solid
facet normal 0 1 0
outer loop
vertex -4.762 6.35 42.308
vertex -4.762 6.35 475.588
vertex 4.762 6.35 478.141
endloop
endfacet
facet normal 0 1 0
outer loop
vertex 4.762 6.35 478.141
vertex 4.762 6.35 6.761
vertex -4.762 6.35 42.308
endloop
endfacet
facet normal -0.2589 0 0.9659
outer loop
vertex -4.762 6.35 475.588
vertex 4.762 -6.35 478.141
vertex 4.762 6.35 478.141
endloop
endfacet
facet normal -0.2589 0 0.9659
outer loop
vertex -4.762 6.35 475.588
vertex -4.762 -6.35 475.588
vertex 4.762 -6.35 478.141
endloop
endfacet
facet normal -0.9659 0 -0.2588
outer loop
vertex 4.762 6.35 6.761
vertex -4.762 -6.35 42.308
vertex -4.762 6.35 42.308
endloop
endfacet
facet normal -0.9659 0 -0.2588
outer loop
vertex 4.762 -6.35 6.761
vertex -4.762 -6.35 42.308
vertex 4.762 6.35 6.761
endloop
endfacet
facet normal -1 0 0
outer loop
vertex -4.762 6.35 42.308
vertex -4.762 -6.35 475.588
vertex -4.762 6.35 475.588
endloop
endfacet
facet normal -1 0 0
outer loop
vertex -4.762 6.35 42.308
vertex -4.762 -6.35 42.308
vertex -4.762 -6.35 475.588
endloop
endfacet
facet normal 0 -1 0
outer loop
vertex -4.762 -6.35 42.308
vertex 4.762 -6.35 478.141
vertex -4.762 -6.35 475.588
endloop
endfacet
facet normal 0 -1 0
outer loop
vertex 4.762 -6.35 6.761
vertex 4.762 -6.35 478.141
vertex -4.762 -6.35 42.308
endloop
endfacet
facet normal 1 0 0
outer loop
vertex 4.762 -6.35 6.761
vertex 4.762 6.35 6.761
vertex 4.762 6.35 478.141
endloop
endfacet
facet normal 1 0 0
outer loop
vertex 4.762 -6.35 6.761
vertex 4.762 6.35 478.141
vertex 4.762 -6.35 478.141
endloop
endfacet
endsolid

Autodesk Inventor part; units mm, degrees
ref_plane "Start plane" through (0, 0, 6.7606) normal (0, 0, 1) x (1, 0, 0)
ref_plane "End plane" through (0, 0, 478.1407) normal (0, 0, 1) x (1, 0, 0)
sketch "Sketch" plane through (0, 0, 0) normal (0, 0, 1) x (1, 0, 0)
  line L0 (4.7625, -6.35) -> (-4.7625, -6.35)
  line L1 (-4.7625, -6.35) -> (-4.7625, 6.35)
  line L2 (-4.7625, 6.35) -> (4.7625, 6.35)
  line L3 (4.7625, 6.35) -> (4.7625, -6.35)
  line L4 (-6, 0) -> (8, 0) construction
  line L5 (0, -30) -> (0, 40) construction
  line L6 (0, 54) -> (0, -44) construction
  line L7 (-9.2, 0) -> (13.2, 0) construction
  dimension "d0" = 12.7
  dimension "d1" = 9.525
  dimension "d4" = 4.7625
  dimension "d5" = 6.35
extrude "Body" add sketch "Sketch" along normal up to surface (471.38 mm away) from surface at 6.7606
sketch "Sketch3" plane through (0, 0, 0) normal (0, 0, 1) x (1, 0, 0)
  line L0 (0, 0) -> (10, 0)
ref_plane "Work Plane3" through (0, 0, 0) normal (0, -1, 0) x (1, 0, 0)
sketch "Sketch4" plane through (0, 0, 0) normal (0, -1, 0) x (1, 0, 0)
  line L0 (-2, 6.7606) -> (12, 6.7606)
  line L1 (-2, 478.1407) -> (12, 478.1407)
  dimension "d9" = 471.38
ref_plane "Work Plane7" through (-1.6435, 0, 476.4242) normal (-0.2588, 0, 0.9659) x (0.9659, 0, 0.2588)
split "Split4" plane through (-1.6435, 0, 476.4242) removes the side toward (-0.2588, 0, 0.9659)
ref_plane "Work Plane8" through (-111.439, -6.35, 440.4306) normal (-0.9659, 0, -0.2588) x (-0.2588, 0, 0.9659)
split "Split5" plane through (-111.439, -6.35, 440.4306) removes the side toward (-0.9659, 0, -0.2588)
equation "\"d0\" = G_W"
equation "\"d1\" = G_H"
equation "\"d4\" = 0.5 * d1"
equation "\"d5\" = 0.5 * d0"
equation "\"d2\" = G_L"
equation "\"G_W\" = 12.7"
equation "\"G_H\" = 9.525"
equation "\"G_L\" = d9"
equation "\"G_OFFSET_START\" = -6.76062"
equation "\"G_OFFSET_END\" = 7.85011"
equation "\"d6\" = -G_OFFSET_START"
equation "\"d7\" = G_OFFSET_END + B_L"
equation "\"B_L\" = 470.29055"
properties part number "AISC - 1/2x3/8 - 18.558" material "Steel, Alloy"
